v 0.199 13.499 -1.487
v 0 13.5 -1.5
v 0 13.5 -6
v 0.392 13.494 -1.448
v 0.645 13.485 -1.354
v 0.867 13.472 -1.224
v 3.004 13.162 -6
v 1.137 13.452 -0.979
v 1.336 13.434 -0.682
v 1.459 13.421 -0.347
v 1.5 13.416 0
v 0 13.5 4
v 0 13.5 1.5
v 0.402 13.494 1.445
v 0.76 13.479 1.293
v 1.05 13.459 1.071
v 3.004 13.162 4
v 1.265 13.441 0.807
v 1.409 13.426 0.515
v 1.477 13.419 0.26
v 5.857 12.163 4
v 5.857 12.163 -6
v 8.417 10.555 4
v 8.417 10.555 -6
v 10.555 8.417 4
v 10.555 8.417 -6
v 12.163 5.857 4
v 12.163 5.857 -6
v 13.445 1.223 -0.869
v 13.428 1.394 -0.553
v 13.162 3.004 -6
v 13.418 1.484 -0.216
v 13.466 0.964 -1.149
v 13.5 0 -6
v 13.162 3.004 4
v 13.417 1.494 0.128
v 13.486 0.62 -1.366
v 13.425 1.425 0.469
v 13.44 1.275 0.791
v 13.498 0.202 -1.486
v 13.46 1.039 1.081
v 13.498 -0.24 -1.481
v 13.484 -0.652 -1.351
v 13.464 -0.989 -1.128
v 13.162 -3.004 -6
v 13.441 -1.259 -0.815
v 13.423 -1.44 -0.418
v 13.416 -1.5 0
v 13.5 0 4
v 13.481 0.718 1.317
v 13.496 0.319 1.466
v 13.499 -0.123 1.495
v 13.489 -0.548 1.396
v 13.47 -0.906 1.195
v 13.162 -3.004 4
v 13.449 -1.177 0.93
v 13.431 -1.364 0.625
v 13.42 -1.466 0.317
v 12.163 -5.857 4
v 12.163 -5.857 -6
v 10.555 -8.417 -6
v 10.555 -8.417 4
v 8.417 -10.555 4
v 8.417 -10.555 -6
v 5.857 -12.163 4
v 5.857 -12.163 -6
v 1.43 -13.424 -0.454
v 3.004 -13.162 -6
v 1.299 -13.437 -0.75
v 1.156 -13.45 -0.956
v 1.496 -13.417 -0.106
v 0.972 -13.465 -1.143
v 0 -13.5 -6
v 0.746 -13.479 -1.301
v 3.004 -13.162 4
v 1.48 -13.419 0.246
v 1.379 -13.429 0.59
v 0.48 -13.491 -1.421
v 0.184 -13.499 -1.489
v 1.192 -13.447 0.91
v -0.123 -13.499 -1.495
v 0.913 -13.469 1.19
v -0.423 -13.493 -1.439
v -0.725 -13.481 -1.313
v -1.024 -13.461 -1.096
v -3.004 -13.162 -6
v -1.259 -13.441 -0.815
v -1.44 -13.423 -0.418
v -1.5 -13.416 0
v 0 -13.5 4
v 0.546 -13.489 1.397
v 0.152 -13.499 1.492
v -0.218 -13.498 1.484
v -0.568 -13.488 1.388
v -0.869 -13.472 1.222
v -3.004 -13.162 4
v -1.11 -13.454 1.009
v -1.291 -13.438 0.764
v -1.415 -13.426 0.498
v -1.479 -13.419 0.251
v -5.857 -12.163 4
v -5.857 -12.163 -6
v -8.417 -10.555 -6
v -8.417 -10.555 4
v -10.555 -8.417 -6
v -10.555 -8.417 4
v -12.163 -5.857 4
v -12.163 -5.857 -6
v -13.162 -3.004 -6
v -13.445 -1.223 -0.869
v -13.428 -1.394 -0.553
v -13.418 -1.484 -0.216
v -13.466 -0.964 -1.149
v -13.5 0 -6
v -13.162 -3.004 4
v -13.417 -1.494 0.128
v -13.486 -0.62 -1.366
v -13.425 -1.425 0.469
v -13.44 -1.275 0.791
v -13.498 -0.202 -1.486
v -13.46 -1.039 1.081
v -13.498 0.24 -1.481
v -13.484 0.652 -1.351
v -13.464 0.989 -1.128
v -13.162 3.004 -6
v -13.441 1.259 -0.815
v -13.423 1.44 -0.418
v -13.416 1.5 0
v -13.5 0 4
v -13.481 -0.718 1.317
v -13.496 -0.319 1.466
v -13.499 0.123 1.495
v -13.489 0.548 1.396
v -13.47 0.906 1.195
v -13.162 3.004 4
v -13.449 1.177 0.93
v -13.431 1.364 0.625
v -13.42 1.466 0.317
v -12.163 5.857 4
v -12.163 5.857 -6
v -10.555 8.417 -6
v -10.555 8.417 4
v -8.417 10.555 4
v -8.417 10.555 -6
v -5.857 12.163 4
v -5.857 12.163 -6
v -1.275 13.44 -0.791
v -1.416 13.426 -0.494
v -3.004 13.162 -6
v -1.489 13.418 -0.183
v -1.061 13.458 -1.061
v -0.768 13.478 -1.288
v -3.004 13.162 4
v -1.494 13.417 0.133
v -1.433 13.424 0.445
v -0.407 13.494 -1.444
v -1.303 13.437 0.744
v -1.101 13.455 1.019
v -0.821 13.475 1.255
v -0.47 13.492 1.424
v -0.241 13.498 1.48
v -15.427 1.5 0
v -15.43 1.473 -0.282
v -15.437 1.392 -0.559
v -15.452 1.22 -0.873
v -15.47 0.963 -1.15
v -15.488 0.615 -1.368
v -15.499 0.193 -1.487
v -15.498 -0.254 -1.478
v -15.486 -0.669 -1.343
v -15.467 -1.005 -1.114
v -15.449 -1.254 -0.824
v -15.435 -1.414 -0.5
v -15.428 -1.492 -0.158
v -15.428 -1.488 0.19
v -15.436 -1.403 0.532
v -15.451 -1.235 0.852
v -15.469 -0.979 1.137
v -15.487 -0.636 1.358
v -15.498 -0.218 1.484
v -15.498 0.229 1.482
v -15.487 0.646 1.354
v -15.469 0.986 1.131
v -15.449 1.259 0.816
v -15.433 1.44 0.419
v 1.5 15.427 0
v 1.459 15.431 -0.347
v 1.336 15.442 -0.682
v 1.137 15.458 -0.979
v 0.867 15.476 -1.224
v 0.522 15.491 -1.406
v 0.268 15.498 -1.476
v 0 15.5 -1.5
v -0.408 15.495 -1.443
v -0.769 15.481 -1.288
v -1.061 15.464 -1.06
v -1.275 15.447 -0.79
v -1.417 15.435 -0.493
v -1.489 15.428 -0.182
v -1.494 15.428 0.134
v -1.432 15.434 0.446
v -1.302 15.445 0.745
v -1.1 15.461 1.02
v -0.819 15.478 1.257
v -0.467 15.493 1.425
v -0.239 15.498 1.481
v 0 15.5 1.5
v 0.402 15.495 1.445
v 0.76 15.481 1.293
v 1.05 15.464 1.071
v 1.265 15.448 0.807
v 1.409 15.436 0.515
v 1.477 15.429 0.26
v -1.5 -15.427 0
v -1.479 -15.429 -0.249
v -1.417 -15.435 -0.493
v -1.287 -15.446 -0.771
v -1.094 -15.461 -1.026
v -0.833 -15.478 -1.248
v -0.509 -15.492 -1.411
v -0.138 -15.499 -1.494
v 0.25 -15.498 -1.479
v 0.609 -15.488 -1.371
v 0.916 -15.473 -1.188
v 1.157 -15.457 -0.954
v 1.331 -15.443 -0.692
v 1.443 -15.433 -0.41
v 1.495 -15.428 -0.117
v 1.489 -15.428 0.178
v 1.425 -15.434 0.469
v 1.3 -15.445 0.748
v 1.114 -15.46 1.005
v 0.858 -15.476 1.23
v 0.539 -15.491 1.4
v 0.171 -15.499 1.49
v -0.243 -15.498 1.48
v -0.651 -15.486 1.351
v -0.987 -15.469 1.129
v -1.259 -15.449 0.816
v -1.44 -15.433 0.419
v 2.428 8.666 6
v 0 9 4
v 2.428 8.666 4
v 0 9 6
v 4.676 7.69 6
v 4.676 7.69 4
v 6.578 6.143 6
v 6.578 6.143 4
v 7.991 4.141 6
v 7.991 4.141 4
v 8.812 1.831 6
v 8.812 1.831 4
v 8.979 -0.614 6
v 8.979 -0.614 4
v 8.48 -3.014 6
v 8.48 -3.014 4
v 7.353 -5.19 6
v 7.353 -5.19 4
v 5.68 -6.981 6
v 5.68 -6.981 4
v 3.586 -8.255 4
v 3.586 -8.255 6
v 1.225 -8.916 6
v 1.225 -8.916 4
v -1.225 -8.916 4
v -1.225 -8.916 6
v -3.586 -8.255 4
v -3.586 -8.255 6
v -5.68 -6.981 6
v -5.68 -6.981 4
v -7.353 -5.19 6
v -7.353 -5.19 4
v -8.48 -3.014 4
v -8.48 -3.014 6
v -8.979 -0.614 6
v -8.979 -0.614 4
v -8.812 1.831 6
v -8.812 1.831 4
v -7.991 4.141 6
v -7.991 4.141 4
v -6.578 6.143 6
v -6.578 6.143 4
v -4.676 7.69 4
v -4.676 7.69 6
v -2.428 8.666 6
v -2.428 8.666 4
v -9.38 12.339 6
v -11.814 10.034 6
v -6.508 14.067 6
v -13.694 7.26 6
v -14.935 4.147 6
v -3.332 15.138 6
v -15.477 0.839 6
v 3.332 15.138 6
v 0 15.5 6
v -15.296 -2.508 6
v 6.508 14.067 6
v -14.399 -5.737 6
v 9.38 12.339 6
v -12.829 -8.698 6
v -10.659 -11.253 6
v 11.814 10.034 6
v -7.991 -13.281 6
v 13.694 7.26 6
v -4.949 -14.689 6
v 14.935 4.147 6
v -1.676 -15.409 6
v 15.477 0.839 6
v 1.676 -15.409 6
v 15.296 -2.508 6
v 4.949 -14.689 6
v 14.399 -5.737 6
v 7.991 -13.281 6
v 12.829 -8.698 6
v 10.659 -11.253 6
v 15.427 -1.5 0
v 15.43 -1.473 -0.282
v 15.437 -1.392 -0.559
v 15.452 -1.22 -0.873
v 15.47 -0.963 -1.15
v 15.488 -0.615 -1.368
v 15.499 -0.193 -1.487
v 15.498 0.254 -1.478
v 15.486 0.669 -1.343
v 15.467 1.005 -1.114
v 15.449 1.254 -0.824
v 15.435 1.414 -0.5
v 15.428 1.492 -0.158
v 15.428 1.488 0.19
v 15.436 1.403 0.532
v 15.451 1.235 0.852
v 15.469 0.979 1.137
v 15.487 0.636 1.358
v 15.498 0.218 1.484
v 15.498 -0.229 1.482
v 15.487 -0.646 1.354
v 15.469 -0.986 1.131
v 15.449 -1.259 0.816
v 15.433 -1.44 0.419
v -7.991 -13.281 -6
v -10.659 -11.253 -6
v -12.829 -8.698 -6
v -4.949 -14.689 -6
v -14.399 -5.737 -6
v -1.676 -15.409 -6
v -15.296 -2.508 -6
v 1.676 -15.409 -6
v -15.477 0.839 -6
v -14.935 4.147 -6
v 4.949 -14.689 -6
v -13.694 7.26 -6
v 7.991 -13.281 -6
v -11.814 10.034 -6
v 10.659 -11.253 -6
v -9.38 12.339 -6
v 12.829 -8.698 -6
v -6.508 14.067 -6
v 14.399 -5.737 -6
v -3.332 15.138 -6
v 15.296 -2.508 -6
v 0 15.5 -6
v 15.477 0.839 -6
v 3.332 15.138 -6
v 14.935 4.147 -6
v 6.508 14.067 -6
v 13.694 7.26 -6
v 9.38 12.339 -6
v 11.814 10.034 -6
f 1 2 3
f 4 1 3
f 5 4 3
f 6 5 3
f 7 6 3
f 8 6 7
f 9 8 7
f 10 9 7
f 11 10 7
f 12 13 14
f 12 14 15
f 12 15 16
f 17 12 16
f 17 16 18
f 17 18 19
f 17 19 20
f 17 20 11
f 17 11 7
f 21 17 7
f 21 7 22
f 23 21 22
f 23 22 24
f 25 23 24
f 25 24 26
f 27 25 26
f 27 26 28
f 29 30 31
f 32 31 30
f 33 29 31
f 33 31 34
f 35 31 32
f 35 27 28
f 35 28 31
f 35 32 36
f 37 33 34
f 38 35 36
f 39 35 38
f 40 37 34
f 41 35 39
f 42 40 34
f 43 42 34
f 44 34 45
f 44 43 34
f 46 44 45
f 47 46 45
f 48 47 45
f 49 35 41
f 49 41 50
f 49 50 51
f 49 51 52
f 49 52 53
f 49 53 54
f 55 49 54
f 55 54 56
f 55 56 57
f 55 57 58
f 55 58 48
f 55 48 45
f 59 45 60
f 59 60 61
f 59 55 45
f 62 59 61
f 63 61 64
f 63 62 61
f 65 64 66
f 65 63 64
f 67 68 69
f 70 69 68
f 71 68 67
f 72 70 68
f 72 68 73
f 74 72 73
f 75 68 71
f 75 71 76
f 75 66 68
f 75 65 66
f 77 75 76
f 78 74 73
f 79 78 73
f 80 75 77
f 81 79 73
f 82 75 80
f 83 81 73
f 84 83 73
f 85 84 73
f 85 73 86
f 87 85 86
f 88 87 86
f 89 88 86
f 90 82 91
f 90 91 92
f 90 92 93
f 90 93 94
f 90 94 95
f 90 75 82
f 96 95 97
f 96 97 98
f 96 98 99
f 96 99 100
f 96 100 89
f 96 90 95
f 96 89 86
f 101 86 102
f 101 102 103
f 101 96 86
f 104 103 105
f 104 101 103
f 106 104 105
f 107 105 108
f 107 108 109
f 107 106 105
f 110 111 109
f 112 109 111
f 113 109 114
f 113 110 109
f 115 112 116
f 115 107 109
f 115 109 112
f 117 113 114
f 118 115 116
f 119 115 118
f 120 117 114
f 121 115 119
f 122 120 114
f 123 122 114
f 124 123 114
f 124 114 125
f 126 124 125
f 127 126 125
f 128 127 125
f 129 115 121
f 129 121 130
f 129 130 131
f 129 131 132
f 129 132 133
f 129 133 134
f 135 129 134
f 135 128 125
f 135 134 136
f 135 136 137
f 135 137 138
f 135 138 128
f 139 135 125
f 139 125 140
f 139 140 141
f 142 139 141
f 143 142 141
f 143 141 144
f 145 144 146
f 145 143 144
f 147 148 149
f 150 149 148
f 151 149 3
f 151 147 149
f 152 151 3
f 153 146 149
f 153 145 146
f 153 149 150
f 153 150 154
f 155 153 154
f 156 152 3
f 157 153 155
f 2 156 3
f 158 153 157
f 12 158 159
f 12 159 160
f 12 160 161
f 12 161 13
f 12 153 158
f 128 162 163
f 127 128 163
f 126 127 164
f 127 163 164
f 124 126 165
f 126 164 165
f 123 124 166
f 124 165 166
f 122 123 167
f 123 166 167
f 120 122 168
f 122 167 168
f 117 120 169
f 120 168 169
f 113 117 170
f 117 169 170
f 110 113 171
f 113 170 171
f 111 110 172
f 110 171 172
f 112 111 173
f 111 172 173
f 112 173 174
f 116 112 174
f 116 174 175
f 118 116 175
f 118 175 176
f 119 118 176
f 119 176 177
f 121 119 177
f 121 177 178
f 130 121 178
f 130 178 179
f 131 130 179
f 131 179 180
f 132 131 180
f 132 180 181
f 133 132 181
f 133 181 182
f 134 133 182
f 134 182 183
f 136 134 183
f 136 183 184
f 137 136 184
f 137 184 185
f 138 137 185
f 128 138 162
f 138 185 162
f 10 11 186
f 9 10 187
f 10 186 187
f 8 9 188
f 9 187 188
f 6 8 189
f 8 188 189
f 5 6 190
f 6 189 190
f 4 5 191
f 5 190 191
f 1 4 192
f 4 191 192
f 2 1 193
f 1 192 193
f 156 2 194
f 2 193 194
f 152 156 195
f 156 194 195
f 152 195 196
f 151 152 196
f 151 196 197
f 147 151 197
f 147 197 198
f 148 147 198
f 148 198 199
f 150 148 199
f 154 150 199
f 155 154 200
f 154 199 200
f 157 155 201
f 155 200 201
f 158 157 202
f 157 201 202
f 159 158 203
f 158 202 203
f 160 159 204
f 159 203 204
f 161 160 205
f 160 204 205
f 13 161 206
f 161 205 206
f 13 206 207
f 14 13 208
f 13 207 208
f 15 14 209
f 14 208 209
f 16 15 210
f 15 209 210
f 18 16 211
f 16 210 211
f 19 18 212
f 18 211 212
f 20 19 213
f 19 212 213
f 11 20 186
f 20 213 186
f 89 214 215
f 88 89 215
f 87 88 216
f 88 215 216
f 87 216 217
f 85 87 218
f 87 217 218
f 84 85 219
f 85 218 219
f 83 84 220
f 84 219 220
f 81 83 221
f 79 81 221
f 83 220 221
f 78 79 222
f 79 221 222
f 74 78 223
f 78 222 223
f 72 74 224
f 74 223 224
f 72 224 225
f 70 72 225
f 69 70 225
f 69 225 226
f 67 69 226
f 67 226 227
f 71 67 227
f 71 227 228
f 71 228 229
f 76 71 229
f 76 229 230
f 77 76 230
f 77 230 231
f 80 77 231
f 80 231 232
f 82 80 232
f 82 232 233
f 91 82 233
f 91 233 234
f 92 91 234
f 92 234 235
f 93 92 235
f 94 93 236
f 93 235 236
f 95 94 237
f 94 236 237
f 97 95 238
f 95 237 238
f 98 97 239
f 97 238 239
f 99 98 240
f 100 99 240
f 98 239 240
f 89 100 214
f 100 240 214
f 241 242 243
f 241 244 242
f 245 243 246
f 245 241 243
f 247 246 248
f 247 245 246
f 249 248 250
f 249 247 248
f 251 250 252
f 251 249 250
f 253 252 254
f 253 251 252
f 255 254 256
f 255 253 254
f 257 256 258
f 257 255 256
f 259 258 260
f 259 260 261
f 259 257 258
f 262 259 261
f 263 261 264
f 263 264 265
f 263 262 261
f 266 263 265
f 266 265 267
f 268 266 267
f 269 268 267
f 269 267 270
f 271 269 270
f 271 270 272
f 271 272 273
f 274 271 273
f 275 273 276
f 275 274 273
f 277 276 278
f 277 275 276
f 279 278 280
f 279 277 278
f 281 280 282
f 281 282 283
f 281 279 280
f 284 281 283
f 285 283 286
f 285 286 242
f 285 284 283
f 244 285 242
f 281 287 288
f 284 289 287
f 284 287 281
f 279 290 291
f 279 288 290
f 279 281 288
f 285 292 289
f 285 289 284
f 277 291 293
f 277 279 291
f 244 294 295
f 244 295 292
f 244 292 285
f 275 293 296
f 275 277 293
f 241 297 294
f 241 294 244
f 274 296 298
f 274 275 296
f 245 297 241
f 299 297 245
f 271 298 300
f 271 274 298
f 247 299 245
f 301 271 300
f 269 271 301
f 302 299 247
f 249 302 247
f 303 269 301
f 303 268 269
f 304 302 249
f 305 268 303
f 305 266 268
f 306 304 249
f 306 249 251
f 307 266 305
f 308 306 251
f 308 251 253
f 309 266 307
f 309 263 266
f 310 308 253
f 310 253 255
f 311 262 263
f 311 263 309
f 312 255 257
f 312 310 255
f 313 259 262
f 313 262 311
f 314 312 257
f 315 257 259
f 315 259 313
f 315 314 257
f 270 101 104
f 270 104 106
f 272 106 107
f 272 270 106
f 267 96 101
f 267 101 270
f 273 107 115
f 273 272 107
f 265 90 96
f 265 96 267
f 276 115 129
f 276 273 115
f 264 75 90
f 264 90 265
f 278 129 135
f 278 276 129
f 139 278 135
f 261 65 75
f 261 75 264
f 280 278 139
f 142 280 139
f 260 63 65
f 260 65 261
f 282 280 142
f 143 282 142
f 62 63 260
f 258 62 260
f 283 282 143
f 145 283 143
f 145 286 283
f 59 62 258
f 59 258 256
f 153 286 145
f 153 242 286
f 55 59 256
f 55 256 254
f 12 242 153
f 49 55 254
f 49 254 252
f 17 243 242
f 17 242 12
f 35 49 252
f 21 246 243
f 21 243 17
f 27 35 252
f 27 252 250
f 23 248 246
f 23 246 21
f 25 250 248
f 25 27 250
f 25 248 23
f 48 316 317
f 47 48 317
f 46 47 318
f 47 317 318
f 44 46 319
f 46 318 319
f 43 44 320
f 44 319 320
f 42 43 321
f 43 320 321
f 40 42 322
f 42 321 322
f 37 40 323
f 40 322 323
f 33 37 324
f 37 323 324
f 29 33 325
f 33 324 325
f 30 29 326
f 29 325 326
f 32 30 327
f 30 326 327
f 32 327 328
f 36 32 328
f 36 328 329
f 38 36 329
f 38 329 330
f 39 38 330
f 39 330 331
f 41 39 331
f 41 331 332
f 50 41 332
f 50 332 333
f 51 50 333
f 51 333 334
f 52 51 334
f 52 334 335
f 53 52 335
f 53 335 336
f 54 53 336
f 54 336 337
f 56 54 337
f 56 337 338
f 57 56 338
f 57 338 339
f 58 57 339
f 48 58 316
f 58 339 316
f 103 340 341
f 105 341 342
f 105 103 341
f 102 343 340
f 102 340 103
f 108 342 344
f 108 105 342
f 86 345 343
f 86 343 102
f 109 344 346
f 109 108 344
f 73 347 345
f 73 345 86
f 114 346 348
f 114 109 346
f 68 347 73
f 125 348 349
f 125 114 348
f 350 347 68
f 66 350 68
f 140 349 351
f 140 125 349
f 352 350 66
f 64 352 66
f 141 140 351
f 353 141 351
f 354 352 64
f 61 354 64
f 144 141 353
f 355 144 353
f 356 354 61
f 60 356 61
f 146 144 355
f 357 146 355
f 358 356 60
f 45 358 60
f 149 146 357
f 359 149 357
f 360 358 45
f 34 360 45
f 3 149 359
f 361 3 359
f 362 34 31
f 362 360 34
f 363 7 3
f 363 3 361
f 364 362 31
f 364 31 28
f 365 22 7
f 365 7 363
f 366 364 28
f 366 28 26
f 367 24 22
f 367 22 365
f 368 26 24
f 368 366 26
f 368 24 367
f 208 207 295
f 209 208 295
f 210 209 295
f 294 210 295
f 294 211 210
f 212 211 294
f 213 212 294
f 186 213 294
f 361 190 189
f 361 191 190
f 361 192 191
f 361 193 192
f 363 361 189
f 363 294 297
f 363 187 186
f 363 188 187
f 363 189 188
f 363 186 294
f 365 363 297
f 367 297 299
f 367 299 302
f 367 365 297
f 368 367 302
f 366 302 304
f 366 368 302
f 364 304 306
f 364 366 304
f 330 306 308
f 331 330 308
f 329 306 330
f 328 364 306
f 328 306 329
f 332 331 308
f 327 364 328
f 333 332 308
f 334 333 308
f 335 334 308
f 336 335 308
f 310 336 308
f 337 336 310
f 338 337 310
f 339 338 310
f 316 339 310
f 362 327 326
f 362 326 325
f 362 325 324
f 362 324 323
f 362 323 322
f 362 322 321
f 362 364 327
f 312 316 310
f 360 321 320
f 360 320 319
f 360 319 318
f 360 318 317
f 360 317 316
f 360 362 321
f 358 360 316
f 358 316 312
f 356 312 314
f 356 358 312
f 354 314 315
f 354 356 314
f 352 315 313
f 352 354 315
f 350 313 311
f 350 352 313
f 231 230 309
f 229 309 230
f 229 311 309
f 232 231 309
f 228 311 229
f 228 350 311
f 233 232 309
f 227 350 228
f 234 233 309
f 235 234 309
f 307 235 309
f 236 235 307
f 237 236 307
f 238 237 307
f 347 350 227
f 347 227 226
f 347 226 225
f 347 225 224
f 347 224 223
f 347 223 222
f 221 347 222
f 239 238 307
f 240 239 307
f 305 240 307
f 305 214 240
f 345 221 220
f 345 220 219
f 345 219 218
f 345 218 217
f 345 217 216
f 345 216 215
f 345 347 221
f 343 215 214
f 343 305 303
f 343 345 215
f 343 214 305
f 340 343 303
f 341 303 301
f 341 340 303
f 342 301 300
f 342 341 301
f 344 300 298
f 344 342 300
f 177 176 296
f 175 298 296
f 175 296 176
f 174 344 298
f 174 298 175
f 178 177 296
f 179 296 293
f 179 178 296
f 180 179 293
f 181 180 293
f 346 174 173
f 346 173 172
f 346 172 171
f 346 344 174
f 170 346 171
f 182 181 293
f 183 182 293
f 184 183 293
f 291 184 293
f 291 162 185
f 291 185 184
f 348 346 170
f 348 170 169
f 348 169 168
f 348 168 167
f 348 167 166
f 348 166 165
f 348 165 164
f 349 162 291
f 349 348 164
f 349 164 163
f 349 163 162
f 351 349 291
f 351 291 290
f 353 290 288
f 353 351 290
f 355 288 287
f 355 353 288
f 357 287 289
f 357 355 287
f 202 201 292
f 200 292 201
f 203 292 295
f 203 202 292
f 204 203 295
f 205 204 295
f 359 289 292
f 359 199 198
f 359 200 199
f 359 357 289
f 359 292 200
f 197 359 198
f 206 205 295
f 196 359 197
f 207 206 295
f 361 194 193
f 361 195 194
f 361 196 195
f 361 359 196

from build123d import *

# Parameters (mm, degrees)
ESQUISSE3_R                  = 1.5
ENL_V_MAT_EXTRU_1_DEPTH      = 5
R_P_TITION_CIRCULAIRE1_COUNT = 4


with BuildPart() as part:
    # Esquisse1 → Révolution1 (revolve)
    with BuildSketch(Plane(origin=(0, 0, 0), x_dir=(0, 0, -1), z_dir=(1, 0, 0))):
        Polygon((-6, 15.5), (6, 15.5), (6, 13.5), (-4, 13.5), (-4, 9), (-6, 9), align=None)
    revolve(axis=Axis((0, 0, 6), (0, 0, -1)))

    # Esquisse3 → Enlèv. mat.-Extru.1 (cut)
    with BuildSketch(Plane(origin=(0, 15.5, 0), x_dir=(1, 0, 0), z_dir=(0, 1, 0))):
        Circle(ESQUISSE3_R)
    enl_v_mat_extru_1 = extrude(amount=-ENL_V_MAT_EXTRU_1_DEPTH, mode=Mode.SUBTRACT)

    # Répétition circulaire1: Enlèv. mat.-Extru.1 ×4 about axis
    r_p_tition_circulaire1_axis = Axis((0, 0, 6), (0, 0, 1))
    for i in range(1, R_P_TITION_CIRCULAIRE1_COUNT):
        add(enl_v_mat_extru_1.rotate(r_p_tition_circulaire1_axis, i * 360 / R_P_TITION_CIRCULAIRE1_COUNT), mode=Mode.SUBTRACT)


solid = part.part
